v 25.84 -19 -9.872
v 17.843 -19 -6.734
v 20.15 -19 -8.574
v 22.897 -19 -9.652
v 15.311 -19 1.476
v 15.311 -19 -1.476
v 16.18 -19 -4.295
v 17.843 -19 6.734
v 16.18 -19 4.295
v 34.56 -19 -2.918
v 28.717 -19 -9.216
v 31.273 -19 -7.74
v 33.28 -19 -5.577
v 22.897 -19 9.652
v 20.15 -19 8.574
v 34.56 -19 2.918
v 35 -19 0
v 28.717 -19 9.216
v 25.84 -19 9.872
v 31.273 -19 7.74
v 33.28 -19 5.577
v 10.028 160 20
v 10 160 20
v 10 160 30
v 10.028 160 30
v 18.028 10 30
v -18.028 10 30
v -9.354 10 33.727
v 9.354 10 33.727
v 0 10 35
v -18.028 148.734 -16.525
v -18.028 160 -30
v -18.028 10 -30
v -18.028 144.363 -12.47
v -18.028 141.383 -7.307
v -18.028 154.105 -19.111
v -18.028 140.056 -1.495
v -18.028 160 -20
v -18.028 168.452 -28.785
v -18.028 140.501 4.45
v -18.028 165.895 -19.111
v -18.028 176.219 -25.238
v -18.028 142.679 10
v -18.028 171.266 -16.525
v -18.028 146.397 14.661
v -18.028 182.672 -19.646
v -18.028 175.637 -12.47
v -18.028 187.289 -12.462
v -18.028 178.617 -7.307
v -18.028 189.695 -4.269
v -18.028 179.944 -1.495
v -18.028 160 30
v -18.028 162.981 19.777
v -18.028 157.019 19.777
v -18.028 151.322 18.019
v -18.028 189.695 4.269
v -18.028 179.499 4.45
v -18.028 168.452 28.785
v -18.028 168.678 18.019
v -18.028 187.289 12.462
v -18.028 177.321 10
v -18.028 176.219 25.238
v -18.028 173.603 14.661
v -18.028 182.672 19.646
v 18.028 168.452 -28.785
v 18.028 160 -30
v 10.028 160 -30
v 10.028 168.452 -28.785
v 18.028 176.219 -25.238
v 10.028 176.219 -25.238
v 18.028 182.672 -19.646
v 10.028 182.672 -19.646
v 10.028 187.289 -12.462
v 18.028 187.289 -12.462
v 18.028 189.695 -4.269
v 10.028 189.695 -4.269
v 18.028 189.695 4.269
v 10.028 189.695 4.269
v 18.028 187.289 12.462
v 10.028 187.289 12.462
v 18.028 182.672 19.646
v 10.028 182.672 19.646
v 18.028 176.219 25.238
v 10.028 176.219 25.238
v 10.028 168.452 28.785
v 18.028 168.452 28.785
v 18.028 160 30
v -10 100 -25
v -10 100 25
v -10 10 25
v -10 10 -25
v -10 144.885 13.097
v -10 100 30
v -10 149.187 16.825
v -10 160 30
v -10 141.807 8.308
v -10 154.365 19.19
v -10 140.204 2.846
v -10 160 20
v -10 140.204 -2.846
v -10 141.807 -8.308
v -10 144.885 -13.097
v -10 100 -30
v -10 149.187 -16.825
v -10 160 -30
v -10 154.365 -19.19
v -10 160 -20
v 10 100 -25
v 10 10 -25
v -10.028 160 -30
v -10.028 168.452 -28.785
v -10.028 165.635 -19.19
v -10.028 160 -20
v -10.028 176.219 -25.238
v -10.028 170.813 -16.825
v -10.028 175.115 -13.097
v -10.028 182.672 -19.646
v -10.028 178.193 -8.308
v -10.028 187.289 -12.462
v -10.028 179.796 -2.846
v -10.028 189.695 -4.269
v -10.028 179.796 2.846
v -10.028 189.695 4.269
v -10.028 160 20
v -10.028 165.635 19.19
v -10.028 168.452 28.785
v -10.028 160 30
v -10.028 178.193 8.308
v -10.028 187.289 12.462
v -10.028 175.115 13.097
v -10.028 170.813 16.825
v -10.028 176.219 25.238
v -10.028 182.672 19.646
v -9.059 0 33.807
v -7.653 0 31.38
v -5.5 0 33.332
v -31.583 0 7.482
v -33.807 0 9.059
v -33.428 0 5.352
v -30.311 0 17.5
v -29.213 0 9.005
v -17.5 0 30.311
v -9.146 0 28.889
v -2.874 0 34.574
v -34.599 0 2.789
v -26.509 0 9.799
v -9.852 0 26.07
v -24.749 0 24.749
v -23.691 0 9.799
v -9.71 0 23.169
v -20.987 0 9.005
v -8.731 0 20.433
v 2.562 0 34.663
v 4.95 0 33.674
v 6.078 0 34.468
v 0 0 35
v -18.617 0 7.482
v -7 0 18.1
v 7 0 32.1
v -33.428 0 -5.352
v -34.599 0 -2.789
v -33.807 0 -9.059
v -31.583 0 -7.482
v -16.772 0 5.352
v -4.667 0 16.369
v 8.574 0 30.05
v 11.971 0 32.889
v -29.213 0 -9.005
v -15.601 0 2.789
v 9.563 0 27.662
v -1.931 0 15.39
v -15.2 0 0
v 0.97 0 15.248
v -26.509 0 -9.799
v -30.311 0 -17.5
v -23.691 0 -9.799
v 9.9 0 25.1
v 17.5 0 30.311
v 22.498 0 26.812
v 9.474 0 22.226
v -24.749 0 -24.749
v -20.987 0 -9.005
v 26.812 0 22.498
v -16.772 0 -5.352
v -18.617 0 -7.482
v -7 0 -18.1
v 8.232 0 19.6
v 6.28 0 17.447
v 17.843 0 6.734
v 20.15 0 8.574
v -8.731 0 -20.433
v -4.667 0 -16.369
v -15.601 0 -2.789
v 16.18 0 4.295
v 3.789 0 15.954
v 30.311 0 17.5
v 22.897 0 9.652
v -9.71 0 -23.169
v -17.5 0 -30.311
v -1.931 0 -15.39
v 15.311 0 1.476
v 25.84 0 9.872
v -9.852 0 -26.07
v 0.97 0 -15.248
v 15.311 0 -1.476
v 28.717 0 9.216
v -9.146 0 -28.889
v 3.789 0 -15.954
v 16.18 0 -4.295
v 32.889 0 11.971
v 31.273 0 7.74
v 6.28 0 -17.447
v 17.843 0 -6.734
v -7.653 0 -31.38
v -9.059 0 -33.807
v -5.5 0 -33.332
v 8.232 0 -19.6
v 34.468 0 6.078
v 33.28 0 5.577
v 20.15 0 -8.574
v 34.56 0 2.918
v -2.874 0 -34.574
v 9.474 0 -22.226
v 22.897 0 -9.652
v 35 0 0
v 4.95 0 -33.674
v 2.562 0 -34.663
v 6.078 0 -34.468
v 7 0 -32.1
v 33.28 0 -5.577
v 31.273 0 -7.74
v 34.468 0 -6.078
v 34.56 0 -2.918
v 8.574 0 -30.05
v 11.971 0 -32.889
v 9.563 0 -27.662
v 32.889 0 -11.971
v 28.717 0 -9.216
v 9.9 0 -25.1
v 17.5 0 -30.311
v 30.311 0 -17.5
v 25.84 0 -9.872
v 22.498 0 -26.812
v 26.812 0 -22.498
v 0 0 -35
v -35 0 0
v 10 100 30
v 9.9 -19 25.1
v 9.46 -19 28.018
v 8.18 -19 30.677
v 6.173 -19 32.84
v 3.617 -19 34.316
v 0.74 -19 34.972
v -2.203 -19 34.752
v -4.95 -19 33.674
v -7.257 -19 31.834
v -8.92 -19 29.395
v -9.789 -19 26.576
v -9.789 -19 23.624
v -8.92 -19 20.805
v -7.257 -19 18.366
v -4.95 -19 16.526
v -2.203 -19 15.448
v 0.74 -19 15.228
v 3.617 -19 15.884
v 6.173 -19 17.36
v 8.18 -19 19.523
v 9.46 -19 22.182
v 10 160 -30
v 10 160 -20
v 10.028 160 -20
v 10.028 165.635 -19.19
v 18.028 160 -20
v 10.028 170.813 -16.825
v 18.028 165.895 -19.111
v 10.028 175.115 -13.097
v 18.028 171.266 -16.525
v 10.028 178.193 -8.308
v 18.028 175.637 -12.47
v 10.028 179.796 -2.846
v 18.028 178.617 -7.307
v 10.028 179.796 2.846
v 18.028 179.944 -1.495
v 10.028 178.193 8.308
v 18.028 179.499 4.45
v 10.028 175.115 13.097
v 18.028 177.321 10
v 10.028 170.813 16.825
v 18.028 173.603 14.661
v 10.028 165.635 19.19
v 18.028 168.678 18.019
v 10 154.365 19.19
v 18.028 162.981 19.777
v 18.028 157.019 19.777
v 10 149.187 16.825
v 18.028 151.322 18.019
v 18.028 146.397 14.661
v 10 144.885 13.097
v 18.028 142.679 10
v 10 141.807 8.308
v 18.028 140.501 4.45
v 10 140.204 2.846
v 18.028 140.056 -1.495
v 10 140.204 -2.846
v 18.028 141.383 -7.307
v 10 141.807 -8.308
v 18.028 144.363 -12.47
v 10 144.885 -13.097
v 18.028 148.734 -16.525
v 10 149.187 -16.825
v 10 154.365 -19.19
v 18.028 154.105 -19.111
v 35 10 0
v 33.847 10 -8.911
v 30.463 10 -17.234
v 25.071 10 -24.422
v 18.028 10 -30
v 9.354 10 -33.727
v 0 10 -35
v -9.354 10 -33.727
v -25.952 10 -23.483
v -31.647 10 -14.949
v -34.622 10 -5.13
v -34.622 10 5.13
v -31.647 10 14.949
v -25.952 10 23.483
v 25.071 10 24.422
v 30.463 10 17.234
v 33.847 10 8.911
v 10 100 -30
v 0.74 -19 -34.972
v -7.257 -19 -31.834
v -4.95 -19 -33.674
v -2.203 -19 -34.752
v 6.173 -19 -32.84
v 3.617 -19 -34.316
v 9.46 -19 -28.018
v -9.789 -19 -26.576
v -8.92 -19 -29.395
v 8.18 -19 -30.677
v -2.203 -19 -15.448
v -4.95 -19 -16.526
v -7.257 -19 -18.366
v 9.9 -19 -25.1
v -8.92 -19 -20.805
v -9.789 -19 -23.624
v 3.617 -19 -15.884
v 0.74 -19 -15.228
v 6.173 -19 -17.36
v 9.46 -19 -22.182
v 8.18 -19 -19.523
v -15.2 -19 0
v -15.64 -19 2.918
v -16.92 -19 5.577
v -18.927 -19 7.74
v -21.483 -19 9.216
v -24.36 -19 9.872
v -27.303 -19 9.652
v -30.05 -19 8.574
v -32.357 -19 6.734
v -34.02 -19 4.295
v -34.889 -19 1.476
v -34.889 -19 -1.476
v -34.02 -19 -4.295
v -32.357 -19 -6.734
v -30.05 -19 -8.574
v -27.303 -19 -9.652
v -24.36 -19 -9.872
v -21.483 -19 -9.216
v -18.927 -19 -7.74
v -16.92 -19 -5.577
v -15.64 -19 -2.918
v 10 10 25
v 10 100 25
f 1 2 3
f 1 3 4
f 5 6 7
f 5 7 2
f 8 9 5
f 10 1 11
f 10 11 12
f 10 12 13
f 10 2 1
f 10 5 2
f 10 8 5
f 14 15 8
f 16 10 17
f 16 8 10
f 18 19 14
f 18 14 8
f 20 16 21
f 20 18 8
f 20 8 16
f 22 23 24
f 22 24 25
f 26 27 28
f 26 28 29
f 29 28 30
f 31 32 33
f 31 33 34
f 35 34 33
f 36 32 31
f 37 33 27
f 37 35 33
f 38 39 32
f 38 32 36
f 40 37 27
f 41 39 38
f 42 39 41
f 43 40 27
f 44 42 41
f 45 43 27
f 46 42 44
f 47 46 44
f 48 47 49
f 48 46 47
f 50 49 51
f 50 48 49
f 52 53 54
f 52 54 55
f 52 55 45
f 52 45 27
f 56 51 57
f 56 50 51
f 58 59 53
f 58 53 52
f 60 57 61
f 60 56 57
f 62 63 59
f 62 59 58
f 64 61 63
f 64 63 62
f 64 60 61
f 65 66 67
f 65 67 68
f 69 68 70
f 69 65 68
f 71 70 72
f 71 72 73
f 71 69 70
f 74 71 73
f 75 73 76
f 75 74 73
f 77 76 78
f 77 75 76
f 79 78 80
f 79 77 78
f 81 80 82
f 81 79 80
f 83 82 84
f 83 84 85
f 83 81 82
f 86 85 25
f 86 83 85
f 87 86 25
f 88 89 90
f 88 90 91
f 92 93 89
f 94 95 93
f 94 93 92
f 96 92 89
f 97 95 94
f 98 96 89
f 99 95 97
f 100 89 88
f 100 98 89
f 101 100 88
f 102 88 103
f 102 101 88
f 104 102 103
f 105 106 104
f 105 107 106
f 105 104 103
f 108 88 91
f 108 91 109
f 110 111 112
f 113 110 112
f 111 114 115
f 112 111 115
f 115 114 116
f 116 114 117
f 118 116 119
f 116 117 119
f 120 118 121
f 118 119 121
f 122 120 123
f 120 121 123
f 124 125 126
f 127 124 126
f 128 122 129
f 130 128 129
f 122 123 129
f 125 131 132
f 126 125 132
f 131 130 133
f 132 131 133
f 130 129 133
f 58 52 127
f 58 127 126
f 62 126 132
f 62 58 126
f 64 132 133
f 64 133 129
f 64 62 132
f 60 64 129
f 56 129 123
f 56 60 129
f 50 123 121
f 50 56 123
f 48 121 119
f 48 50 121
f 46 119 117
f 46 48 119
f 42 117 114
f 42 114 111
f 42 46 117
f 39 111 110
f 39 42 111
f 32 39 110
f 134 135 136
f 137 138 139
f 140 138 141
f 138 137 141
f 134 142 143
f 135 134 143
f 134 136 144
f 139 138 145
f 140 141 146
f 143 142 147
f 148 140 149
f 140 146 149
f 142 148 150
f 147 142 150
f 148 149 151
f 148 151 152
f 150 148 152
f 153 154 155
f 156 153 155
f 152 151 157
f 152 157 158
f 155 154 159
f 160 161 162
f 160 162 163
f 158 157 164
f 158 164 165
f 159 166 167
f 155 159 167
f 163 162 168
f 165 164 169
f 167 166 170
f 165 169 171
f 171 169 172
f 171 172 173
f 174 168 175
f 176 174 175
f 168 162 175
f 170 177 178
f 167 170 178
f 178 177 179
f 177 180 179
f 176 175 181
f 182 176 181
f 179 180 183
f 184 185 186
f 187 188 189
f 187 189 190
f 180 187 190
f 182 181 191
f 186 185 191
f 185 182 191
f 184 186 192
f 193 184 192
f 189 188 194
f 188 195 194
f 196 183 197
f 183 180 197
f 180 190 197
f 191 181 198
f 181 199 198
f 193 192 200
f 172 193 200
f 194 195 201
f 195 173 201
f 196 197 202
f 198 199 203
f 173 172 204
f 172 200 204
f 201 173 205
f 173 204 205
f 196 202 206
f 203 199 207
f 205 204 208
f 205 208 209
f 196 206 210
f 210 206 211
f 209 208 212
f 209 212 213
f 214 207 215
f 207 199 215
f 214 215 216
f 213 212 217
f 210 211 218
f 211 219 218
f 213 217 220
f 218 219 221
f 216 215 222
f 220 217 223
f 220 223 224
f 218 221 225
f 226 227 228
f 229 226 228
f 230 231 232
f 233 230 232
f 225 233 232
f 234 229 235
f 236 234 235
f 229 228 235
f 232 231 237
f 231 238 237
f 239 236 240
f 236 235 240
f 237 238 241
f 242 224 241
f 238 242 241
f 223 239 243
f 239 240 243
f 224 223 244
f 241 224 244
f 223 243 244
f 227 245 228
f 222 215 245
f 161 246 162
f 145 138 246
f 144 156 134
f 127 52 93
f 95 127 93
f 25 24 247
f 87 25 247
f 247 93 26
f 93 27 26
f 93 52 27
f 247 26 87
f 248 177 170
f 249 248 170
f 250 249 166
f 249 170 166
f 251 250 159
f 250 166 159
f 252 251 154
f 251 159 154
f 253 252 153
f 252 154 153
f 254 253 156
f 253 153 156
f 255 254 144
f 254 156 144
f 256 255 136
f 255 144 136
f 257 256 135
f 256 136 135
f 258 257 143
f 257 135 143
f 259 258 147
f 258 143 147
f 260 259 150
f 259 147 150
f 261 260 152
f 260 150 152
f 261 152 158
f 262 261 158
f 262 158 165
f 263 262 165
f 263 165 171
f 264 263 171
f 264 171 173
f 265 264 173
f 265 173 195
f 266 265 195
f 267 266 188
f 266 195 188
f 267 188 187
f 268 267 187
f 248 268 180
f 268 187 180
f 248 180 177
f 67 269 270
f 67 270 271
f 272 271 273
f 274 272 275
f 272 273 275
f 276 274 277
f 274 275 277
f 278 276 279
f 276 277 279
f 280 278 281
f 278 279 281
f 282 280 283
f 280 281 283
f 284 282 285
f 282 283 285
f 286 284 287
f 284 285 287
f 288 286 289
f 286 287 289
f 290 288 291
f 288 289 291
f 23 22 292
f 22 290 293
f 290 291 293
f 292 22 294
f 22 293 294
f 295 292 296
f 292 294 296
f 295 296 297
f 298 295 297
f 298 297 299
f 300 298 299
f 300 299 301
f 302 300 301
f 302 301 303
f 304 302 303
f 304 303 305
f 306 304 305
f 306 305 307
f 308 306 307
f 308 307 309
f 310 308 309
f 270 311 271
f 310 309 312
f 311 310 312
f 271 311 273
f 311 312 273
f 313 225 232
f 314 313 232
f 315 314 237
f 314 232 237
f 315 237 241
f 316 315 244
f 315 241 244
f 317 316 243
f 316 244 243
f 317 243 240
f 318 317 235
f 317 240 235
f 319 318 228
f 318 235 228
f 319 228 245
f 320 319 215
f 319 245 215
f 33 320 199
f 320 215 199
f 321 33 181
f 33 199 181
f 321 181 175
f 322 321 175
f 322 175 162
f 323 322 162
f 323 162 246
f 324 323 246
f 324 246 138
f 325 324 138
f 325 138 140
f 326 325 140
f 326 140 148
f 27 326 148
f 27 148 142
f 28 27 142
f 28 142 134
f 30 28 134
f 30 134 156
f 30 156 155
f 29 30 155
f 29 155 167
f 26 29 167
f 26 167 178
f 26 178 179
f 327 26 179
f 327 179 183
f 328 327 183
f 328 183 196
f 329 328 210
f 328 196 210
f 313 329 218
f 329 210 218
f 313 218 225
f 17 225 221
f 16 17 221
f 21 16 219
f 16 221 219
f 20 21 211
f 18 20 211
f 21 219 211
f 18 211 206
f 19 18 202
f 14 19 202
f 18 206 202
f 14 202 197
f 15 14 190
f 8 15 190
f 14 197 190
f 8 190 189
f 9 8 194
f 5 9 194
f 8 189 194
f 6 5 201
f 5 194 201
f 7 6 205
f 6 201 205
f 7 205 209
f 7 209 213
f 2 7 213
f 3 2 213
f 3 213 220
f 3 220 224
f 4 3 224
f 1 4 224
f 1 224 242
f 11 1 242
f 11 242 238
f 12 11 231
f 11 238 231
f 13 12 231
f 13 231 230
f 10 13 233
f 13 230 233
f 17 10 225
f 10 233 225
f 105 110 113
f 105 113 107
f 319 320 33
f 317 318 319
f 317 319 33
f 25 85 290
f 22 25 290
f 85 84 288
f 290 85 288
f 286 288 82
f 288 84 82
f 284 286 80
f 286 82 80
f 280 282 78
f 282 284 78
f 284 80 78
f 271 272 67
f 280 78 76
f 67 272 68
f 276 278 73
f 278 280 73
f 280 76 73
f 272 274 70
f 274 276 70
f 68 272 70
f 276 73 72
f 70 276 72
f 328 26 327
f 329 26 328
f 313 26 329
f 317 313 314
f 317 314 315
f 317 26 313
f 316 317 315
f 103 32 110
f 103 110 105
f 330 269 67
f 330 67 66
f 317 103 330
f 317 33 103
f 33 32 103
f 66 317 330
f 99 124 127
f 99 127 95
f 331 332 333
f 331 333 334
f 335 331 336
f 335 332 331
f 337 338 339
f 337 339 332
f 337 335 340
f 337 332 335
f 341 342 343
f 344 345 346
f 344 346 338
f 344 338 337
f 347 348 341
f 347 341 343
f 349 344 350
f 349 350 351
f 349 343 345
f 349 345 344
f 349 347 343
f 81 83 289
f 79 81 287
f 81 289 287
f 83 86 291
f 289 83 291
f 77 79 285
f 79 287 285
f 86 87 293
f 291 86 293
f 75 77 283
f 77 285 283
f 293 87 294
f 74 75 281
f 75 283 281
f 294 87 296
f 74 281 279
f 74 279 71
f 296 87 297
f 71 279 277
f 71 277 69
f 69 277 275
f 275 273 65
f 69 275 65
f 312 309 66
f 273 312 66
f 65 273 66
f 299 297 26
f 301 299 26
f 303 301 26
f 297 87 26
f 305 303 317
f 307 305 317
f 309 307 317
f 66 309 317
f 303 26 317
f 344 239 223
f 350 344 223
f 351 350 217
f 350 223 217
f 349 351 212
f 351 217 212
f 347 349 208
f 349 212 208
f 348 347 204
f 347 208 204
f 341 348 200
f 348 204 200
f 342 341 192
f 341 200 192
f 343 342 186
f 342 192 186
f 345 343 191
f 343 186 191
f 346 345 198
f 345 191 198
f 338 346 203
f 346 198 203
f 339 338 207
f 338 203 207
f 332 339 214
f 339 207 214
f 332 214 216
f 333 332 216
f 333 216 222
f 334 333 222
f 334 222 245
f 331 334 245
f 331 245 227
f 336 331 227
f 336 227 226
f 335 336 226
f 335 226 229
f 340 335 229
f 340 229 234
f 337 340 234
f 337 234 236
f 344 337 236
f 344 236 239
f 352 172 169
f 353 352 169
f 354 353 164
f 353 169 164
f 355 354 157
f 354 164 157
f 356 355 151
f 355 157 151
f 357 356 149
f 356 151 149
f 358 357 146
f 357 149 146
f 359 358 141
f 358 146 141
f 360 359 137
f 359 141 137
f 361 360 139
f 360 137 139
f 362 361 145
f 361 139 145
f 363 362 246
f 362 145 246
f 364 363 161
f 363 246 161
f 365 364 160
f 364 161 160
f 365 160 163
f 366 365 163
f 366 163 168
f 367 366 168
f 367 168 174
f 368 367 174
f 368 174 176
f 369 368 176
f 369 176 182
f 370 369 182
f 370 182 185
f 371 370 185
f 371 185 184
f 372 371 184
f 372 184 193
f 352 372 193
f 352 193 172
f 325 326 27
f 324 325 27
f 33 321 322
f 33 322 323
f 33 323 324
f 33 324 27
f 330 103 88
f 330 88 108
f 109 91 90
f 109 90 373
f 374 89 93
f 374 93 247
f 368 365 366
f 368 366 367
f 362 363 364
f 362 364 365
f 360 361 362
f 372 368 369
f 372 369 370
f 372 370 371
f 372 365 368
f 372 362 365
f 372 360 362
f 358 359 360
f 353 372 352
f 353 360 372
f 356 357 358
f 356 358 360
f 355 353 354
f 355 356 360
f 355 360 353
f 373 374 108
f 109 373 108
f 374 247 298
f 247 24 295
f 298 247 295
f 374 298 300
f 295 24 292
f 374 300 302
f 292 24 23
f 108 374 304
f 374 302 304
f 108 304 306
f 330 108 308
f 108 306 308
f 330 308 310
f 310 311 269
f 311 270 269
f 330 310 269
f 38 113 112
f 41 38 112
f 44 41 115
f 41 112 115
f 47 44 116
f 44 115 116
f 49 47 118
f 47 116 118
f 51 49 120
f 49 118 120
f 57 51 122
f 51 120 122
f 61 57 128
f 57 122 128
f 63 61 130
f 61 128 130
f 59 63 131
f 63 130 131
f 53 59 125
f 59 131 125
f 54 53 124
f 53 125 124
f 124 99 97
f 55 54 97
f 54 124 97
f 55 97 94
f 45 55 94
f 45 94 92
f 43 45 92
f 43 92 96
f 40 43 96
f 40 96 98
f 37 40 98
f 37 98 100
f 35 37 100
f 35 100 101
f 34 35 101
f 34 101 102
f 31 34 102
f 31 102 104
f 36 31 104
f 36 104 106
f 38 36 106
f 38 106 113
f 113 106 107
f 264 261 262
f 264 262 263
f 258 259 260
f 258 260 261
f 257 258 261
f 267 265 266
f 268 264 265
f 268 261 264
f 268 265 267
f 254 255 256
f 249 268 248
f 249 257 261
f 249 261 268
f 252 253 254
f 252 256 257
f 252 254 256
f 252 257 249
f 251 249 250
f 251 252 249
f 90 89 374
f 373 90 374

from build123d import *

# Parameters (mm, degrees)
SKETCH1_R            = 35
BOSS_EXTRUDE1_DEPTH  = 10
SKETCH3_R            = 9.9
BOSS_EXTRUDE2_DEPTH  = 19
SKETCH4_W            = 36.055512754
SKETCH4_H            = 60
BOSS_EXTRUDE8_DEPTH  = 150
SKETCH11_W           = 20
SKETCH11_H           = 60
CUT_EXTRUDE2_DEPTH   = 60
SKETCH12_W           = 20
SKETCH12_H           = 50
CUT_EXTRUDE3_DEPTH   = 90
SKETCH13_R           = 30
BOSS_EXTRUDE9_DEPTH  = 8
SKETCH14_R           = 30
BOSS_EXTRUDE10_DEPTH = 8
SKETCH15_R           = 20
CUT_EXTRUDE4_DEPTH   = 97


with BuildPart() as part:
    # Sketch1 → Boss-Extrude1 (new body)
    with BuildSketch(Plane(origin=(0, 0, 0), x_dir=(1, 0, 0), z_dir=(0, 1, 0))):
        Circle(SKETCH1_R)
    extrude(amount=BOSS_EXTRUDE1_DEPTH)

    # Sketch3 → Boss-Extrude2 (add)
    with BuildSketch(Plane.XZ):
        with Locations((25.1, 0)):
            Circle(SKETCH3_R)
        with Locations((0, -25.1)):
            Circle(SKETCH3_R)
        with Locations((-25.1, 0)):
            Circle(SKETCH3_R)
        with Locations((0, 25.1)):
            Circle(SKETCH3_R)
    extrude(amount=BOSS_EXTRUDE2_DEPTH)

    # Sketch4 → Boss-Extrude8 (add)
    with BuildSketch(Plane(origin=(0, 10, 0), x_dir=(1, 0, 0), z_dir=(0, 1, 0))):
        Rectangle(SKETCH4_W, SKETCH4_H)
    extrude(amount=BOSS_EXTRUDE8_DEPTH)

    # Sketch11 → Cut-Extrude2 (cut)
    with BuildSketch(Plane(origin=(0, 160, 0), x_dir=(1, 0, 0), z_dir=(0, 1, 0))):
        Rectangle(SKETCH11_W, SKETCH11_H)
    extrude(amount=-CUT_EXTRUDE2_DEPTH, mode=Mode.SUBTRACT)

    # Sketch12 → Cut-Extrude3 (cut)
    with BuildSketch(Plane(origin=(0, 100, 0), x_dir=(1, 0, 0), z_dir=(0, 1, 0))):
        Rectangle(SKETCH12_W, SKETCH12_H)
    extrude(amount=-CUT_EXTRUDE3_DEPTH, mode=Mode.SUBTRACT)

    # Sketch13 → Boss-Extrude9 (add)
    with BuildSketch(Plane.ZY.offset(18.027756377)):
        with Locations((0, 160)):
            Circle(SKETCH13_R)
    extrude(amount=-BOSS_EXTRUDE9_DEPTH)

    # Sketch14 → Boss-Extrude10 (add)
    with BuildSketch(Plane(origin=(18.027756377, 0, 0), x_dir=(0, 0, -1), z_dir=(1, 0, 0))):
        with Locations((0, 160)):
            Circle(SKETCH14_R)
    extrude(amount=-BOSS_EXTRUDE10_DEPTH)

    # Sketch15 → Cut-Extrude4 (cut)
    with BuildSketch(Plane(origin=(18.027756377, 0, 0), x_dir=(0, 0, -1), z_dir=(1, 0, 0))):
        with Locations((0, 160)):
            Circle(SKETCH15_R)
    extrude(amount=-CUT_EXTRUDE4_DEPTH, mode=Mode.SUBTRACT)


solid = part.part
